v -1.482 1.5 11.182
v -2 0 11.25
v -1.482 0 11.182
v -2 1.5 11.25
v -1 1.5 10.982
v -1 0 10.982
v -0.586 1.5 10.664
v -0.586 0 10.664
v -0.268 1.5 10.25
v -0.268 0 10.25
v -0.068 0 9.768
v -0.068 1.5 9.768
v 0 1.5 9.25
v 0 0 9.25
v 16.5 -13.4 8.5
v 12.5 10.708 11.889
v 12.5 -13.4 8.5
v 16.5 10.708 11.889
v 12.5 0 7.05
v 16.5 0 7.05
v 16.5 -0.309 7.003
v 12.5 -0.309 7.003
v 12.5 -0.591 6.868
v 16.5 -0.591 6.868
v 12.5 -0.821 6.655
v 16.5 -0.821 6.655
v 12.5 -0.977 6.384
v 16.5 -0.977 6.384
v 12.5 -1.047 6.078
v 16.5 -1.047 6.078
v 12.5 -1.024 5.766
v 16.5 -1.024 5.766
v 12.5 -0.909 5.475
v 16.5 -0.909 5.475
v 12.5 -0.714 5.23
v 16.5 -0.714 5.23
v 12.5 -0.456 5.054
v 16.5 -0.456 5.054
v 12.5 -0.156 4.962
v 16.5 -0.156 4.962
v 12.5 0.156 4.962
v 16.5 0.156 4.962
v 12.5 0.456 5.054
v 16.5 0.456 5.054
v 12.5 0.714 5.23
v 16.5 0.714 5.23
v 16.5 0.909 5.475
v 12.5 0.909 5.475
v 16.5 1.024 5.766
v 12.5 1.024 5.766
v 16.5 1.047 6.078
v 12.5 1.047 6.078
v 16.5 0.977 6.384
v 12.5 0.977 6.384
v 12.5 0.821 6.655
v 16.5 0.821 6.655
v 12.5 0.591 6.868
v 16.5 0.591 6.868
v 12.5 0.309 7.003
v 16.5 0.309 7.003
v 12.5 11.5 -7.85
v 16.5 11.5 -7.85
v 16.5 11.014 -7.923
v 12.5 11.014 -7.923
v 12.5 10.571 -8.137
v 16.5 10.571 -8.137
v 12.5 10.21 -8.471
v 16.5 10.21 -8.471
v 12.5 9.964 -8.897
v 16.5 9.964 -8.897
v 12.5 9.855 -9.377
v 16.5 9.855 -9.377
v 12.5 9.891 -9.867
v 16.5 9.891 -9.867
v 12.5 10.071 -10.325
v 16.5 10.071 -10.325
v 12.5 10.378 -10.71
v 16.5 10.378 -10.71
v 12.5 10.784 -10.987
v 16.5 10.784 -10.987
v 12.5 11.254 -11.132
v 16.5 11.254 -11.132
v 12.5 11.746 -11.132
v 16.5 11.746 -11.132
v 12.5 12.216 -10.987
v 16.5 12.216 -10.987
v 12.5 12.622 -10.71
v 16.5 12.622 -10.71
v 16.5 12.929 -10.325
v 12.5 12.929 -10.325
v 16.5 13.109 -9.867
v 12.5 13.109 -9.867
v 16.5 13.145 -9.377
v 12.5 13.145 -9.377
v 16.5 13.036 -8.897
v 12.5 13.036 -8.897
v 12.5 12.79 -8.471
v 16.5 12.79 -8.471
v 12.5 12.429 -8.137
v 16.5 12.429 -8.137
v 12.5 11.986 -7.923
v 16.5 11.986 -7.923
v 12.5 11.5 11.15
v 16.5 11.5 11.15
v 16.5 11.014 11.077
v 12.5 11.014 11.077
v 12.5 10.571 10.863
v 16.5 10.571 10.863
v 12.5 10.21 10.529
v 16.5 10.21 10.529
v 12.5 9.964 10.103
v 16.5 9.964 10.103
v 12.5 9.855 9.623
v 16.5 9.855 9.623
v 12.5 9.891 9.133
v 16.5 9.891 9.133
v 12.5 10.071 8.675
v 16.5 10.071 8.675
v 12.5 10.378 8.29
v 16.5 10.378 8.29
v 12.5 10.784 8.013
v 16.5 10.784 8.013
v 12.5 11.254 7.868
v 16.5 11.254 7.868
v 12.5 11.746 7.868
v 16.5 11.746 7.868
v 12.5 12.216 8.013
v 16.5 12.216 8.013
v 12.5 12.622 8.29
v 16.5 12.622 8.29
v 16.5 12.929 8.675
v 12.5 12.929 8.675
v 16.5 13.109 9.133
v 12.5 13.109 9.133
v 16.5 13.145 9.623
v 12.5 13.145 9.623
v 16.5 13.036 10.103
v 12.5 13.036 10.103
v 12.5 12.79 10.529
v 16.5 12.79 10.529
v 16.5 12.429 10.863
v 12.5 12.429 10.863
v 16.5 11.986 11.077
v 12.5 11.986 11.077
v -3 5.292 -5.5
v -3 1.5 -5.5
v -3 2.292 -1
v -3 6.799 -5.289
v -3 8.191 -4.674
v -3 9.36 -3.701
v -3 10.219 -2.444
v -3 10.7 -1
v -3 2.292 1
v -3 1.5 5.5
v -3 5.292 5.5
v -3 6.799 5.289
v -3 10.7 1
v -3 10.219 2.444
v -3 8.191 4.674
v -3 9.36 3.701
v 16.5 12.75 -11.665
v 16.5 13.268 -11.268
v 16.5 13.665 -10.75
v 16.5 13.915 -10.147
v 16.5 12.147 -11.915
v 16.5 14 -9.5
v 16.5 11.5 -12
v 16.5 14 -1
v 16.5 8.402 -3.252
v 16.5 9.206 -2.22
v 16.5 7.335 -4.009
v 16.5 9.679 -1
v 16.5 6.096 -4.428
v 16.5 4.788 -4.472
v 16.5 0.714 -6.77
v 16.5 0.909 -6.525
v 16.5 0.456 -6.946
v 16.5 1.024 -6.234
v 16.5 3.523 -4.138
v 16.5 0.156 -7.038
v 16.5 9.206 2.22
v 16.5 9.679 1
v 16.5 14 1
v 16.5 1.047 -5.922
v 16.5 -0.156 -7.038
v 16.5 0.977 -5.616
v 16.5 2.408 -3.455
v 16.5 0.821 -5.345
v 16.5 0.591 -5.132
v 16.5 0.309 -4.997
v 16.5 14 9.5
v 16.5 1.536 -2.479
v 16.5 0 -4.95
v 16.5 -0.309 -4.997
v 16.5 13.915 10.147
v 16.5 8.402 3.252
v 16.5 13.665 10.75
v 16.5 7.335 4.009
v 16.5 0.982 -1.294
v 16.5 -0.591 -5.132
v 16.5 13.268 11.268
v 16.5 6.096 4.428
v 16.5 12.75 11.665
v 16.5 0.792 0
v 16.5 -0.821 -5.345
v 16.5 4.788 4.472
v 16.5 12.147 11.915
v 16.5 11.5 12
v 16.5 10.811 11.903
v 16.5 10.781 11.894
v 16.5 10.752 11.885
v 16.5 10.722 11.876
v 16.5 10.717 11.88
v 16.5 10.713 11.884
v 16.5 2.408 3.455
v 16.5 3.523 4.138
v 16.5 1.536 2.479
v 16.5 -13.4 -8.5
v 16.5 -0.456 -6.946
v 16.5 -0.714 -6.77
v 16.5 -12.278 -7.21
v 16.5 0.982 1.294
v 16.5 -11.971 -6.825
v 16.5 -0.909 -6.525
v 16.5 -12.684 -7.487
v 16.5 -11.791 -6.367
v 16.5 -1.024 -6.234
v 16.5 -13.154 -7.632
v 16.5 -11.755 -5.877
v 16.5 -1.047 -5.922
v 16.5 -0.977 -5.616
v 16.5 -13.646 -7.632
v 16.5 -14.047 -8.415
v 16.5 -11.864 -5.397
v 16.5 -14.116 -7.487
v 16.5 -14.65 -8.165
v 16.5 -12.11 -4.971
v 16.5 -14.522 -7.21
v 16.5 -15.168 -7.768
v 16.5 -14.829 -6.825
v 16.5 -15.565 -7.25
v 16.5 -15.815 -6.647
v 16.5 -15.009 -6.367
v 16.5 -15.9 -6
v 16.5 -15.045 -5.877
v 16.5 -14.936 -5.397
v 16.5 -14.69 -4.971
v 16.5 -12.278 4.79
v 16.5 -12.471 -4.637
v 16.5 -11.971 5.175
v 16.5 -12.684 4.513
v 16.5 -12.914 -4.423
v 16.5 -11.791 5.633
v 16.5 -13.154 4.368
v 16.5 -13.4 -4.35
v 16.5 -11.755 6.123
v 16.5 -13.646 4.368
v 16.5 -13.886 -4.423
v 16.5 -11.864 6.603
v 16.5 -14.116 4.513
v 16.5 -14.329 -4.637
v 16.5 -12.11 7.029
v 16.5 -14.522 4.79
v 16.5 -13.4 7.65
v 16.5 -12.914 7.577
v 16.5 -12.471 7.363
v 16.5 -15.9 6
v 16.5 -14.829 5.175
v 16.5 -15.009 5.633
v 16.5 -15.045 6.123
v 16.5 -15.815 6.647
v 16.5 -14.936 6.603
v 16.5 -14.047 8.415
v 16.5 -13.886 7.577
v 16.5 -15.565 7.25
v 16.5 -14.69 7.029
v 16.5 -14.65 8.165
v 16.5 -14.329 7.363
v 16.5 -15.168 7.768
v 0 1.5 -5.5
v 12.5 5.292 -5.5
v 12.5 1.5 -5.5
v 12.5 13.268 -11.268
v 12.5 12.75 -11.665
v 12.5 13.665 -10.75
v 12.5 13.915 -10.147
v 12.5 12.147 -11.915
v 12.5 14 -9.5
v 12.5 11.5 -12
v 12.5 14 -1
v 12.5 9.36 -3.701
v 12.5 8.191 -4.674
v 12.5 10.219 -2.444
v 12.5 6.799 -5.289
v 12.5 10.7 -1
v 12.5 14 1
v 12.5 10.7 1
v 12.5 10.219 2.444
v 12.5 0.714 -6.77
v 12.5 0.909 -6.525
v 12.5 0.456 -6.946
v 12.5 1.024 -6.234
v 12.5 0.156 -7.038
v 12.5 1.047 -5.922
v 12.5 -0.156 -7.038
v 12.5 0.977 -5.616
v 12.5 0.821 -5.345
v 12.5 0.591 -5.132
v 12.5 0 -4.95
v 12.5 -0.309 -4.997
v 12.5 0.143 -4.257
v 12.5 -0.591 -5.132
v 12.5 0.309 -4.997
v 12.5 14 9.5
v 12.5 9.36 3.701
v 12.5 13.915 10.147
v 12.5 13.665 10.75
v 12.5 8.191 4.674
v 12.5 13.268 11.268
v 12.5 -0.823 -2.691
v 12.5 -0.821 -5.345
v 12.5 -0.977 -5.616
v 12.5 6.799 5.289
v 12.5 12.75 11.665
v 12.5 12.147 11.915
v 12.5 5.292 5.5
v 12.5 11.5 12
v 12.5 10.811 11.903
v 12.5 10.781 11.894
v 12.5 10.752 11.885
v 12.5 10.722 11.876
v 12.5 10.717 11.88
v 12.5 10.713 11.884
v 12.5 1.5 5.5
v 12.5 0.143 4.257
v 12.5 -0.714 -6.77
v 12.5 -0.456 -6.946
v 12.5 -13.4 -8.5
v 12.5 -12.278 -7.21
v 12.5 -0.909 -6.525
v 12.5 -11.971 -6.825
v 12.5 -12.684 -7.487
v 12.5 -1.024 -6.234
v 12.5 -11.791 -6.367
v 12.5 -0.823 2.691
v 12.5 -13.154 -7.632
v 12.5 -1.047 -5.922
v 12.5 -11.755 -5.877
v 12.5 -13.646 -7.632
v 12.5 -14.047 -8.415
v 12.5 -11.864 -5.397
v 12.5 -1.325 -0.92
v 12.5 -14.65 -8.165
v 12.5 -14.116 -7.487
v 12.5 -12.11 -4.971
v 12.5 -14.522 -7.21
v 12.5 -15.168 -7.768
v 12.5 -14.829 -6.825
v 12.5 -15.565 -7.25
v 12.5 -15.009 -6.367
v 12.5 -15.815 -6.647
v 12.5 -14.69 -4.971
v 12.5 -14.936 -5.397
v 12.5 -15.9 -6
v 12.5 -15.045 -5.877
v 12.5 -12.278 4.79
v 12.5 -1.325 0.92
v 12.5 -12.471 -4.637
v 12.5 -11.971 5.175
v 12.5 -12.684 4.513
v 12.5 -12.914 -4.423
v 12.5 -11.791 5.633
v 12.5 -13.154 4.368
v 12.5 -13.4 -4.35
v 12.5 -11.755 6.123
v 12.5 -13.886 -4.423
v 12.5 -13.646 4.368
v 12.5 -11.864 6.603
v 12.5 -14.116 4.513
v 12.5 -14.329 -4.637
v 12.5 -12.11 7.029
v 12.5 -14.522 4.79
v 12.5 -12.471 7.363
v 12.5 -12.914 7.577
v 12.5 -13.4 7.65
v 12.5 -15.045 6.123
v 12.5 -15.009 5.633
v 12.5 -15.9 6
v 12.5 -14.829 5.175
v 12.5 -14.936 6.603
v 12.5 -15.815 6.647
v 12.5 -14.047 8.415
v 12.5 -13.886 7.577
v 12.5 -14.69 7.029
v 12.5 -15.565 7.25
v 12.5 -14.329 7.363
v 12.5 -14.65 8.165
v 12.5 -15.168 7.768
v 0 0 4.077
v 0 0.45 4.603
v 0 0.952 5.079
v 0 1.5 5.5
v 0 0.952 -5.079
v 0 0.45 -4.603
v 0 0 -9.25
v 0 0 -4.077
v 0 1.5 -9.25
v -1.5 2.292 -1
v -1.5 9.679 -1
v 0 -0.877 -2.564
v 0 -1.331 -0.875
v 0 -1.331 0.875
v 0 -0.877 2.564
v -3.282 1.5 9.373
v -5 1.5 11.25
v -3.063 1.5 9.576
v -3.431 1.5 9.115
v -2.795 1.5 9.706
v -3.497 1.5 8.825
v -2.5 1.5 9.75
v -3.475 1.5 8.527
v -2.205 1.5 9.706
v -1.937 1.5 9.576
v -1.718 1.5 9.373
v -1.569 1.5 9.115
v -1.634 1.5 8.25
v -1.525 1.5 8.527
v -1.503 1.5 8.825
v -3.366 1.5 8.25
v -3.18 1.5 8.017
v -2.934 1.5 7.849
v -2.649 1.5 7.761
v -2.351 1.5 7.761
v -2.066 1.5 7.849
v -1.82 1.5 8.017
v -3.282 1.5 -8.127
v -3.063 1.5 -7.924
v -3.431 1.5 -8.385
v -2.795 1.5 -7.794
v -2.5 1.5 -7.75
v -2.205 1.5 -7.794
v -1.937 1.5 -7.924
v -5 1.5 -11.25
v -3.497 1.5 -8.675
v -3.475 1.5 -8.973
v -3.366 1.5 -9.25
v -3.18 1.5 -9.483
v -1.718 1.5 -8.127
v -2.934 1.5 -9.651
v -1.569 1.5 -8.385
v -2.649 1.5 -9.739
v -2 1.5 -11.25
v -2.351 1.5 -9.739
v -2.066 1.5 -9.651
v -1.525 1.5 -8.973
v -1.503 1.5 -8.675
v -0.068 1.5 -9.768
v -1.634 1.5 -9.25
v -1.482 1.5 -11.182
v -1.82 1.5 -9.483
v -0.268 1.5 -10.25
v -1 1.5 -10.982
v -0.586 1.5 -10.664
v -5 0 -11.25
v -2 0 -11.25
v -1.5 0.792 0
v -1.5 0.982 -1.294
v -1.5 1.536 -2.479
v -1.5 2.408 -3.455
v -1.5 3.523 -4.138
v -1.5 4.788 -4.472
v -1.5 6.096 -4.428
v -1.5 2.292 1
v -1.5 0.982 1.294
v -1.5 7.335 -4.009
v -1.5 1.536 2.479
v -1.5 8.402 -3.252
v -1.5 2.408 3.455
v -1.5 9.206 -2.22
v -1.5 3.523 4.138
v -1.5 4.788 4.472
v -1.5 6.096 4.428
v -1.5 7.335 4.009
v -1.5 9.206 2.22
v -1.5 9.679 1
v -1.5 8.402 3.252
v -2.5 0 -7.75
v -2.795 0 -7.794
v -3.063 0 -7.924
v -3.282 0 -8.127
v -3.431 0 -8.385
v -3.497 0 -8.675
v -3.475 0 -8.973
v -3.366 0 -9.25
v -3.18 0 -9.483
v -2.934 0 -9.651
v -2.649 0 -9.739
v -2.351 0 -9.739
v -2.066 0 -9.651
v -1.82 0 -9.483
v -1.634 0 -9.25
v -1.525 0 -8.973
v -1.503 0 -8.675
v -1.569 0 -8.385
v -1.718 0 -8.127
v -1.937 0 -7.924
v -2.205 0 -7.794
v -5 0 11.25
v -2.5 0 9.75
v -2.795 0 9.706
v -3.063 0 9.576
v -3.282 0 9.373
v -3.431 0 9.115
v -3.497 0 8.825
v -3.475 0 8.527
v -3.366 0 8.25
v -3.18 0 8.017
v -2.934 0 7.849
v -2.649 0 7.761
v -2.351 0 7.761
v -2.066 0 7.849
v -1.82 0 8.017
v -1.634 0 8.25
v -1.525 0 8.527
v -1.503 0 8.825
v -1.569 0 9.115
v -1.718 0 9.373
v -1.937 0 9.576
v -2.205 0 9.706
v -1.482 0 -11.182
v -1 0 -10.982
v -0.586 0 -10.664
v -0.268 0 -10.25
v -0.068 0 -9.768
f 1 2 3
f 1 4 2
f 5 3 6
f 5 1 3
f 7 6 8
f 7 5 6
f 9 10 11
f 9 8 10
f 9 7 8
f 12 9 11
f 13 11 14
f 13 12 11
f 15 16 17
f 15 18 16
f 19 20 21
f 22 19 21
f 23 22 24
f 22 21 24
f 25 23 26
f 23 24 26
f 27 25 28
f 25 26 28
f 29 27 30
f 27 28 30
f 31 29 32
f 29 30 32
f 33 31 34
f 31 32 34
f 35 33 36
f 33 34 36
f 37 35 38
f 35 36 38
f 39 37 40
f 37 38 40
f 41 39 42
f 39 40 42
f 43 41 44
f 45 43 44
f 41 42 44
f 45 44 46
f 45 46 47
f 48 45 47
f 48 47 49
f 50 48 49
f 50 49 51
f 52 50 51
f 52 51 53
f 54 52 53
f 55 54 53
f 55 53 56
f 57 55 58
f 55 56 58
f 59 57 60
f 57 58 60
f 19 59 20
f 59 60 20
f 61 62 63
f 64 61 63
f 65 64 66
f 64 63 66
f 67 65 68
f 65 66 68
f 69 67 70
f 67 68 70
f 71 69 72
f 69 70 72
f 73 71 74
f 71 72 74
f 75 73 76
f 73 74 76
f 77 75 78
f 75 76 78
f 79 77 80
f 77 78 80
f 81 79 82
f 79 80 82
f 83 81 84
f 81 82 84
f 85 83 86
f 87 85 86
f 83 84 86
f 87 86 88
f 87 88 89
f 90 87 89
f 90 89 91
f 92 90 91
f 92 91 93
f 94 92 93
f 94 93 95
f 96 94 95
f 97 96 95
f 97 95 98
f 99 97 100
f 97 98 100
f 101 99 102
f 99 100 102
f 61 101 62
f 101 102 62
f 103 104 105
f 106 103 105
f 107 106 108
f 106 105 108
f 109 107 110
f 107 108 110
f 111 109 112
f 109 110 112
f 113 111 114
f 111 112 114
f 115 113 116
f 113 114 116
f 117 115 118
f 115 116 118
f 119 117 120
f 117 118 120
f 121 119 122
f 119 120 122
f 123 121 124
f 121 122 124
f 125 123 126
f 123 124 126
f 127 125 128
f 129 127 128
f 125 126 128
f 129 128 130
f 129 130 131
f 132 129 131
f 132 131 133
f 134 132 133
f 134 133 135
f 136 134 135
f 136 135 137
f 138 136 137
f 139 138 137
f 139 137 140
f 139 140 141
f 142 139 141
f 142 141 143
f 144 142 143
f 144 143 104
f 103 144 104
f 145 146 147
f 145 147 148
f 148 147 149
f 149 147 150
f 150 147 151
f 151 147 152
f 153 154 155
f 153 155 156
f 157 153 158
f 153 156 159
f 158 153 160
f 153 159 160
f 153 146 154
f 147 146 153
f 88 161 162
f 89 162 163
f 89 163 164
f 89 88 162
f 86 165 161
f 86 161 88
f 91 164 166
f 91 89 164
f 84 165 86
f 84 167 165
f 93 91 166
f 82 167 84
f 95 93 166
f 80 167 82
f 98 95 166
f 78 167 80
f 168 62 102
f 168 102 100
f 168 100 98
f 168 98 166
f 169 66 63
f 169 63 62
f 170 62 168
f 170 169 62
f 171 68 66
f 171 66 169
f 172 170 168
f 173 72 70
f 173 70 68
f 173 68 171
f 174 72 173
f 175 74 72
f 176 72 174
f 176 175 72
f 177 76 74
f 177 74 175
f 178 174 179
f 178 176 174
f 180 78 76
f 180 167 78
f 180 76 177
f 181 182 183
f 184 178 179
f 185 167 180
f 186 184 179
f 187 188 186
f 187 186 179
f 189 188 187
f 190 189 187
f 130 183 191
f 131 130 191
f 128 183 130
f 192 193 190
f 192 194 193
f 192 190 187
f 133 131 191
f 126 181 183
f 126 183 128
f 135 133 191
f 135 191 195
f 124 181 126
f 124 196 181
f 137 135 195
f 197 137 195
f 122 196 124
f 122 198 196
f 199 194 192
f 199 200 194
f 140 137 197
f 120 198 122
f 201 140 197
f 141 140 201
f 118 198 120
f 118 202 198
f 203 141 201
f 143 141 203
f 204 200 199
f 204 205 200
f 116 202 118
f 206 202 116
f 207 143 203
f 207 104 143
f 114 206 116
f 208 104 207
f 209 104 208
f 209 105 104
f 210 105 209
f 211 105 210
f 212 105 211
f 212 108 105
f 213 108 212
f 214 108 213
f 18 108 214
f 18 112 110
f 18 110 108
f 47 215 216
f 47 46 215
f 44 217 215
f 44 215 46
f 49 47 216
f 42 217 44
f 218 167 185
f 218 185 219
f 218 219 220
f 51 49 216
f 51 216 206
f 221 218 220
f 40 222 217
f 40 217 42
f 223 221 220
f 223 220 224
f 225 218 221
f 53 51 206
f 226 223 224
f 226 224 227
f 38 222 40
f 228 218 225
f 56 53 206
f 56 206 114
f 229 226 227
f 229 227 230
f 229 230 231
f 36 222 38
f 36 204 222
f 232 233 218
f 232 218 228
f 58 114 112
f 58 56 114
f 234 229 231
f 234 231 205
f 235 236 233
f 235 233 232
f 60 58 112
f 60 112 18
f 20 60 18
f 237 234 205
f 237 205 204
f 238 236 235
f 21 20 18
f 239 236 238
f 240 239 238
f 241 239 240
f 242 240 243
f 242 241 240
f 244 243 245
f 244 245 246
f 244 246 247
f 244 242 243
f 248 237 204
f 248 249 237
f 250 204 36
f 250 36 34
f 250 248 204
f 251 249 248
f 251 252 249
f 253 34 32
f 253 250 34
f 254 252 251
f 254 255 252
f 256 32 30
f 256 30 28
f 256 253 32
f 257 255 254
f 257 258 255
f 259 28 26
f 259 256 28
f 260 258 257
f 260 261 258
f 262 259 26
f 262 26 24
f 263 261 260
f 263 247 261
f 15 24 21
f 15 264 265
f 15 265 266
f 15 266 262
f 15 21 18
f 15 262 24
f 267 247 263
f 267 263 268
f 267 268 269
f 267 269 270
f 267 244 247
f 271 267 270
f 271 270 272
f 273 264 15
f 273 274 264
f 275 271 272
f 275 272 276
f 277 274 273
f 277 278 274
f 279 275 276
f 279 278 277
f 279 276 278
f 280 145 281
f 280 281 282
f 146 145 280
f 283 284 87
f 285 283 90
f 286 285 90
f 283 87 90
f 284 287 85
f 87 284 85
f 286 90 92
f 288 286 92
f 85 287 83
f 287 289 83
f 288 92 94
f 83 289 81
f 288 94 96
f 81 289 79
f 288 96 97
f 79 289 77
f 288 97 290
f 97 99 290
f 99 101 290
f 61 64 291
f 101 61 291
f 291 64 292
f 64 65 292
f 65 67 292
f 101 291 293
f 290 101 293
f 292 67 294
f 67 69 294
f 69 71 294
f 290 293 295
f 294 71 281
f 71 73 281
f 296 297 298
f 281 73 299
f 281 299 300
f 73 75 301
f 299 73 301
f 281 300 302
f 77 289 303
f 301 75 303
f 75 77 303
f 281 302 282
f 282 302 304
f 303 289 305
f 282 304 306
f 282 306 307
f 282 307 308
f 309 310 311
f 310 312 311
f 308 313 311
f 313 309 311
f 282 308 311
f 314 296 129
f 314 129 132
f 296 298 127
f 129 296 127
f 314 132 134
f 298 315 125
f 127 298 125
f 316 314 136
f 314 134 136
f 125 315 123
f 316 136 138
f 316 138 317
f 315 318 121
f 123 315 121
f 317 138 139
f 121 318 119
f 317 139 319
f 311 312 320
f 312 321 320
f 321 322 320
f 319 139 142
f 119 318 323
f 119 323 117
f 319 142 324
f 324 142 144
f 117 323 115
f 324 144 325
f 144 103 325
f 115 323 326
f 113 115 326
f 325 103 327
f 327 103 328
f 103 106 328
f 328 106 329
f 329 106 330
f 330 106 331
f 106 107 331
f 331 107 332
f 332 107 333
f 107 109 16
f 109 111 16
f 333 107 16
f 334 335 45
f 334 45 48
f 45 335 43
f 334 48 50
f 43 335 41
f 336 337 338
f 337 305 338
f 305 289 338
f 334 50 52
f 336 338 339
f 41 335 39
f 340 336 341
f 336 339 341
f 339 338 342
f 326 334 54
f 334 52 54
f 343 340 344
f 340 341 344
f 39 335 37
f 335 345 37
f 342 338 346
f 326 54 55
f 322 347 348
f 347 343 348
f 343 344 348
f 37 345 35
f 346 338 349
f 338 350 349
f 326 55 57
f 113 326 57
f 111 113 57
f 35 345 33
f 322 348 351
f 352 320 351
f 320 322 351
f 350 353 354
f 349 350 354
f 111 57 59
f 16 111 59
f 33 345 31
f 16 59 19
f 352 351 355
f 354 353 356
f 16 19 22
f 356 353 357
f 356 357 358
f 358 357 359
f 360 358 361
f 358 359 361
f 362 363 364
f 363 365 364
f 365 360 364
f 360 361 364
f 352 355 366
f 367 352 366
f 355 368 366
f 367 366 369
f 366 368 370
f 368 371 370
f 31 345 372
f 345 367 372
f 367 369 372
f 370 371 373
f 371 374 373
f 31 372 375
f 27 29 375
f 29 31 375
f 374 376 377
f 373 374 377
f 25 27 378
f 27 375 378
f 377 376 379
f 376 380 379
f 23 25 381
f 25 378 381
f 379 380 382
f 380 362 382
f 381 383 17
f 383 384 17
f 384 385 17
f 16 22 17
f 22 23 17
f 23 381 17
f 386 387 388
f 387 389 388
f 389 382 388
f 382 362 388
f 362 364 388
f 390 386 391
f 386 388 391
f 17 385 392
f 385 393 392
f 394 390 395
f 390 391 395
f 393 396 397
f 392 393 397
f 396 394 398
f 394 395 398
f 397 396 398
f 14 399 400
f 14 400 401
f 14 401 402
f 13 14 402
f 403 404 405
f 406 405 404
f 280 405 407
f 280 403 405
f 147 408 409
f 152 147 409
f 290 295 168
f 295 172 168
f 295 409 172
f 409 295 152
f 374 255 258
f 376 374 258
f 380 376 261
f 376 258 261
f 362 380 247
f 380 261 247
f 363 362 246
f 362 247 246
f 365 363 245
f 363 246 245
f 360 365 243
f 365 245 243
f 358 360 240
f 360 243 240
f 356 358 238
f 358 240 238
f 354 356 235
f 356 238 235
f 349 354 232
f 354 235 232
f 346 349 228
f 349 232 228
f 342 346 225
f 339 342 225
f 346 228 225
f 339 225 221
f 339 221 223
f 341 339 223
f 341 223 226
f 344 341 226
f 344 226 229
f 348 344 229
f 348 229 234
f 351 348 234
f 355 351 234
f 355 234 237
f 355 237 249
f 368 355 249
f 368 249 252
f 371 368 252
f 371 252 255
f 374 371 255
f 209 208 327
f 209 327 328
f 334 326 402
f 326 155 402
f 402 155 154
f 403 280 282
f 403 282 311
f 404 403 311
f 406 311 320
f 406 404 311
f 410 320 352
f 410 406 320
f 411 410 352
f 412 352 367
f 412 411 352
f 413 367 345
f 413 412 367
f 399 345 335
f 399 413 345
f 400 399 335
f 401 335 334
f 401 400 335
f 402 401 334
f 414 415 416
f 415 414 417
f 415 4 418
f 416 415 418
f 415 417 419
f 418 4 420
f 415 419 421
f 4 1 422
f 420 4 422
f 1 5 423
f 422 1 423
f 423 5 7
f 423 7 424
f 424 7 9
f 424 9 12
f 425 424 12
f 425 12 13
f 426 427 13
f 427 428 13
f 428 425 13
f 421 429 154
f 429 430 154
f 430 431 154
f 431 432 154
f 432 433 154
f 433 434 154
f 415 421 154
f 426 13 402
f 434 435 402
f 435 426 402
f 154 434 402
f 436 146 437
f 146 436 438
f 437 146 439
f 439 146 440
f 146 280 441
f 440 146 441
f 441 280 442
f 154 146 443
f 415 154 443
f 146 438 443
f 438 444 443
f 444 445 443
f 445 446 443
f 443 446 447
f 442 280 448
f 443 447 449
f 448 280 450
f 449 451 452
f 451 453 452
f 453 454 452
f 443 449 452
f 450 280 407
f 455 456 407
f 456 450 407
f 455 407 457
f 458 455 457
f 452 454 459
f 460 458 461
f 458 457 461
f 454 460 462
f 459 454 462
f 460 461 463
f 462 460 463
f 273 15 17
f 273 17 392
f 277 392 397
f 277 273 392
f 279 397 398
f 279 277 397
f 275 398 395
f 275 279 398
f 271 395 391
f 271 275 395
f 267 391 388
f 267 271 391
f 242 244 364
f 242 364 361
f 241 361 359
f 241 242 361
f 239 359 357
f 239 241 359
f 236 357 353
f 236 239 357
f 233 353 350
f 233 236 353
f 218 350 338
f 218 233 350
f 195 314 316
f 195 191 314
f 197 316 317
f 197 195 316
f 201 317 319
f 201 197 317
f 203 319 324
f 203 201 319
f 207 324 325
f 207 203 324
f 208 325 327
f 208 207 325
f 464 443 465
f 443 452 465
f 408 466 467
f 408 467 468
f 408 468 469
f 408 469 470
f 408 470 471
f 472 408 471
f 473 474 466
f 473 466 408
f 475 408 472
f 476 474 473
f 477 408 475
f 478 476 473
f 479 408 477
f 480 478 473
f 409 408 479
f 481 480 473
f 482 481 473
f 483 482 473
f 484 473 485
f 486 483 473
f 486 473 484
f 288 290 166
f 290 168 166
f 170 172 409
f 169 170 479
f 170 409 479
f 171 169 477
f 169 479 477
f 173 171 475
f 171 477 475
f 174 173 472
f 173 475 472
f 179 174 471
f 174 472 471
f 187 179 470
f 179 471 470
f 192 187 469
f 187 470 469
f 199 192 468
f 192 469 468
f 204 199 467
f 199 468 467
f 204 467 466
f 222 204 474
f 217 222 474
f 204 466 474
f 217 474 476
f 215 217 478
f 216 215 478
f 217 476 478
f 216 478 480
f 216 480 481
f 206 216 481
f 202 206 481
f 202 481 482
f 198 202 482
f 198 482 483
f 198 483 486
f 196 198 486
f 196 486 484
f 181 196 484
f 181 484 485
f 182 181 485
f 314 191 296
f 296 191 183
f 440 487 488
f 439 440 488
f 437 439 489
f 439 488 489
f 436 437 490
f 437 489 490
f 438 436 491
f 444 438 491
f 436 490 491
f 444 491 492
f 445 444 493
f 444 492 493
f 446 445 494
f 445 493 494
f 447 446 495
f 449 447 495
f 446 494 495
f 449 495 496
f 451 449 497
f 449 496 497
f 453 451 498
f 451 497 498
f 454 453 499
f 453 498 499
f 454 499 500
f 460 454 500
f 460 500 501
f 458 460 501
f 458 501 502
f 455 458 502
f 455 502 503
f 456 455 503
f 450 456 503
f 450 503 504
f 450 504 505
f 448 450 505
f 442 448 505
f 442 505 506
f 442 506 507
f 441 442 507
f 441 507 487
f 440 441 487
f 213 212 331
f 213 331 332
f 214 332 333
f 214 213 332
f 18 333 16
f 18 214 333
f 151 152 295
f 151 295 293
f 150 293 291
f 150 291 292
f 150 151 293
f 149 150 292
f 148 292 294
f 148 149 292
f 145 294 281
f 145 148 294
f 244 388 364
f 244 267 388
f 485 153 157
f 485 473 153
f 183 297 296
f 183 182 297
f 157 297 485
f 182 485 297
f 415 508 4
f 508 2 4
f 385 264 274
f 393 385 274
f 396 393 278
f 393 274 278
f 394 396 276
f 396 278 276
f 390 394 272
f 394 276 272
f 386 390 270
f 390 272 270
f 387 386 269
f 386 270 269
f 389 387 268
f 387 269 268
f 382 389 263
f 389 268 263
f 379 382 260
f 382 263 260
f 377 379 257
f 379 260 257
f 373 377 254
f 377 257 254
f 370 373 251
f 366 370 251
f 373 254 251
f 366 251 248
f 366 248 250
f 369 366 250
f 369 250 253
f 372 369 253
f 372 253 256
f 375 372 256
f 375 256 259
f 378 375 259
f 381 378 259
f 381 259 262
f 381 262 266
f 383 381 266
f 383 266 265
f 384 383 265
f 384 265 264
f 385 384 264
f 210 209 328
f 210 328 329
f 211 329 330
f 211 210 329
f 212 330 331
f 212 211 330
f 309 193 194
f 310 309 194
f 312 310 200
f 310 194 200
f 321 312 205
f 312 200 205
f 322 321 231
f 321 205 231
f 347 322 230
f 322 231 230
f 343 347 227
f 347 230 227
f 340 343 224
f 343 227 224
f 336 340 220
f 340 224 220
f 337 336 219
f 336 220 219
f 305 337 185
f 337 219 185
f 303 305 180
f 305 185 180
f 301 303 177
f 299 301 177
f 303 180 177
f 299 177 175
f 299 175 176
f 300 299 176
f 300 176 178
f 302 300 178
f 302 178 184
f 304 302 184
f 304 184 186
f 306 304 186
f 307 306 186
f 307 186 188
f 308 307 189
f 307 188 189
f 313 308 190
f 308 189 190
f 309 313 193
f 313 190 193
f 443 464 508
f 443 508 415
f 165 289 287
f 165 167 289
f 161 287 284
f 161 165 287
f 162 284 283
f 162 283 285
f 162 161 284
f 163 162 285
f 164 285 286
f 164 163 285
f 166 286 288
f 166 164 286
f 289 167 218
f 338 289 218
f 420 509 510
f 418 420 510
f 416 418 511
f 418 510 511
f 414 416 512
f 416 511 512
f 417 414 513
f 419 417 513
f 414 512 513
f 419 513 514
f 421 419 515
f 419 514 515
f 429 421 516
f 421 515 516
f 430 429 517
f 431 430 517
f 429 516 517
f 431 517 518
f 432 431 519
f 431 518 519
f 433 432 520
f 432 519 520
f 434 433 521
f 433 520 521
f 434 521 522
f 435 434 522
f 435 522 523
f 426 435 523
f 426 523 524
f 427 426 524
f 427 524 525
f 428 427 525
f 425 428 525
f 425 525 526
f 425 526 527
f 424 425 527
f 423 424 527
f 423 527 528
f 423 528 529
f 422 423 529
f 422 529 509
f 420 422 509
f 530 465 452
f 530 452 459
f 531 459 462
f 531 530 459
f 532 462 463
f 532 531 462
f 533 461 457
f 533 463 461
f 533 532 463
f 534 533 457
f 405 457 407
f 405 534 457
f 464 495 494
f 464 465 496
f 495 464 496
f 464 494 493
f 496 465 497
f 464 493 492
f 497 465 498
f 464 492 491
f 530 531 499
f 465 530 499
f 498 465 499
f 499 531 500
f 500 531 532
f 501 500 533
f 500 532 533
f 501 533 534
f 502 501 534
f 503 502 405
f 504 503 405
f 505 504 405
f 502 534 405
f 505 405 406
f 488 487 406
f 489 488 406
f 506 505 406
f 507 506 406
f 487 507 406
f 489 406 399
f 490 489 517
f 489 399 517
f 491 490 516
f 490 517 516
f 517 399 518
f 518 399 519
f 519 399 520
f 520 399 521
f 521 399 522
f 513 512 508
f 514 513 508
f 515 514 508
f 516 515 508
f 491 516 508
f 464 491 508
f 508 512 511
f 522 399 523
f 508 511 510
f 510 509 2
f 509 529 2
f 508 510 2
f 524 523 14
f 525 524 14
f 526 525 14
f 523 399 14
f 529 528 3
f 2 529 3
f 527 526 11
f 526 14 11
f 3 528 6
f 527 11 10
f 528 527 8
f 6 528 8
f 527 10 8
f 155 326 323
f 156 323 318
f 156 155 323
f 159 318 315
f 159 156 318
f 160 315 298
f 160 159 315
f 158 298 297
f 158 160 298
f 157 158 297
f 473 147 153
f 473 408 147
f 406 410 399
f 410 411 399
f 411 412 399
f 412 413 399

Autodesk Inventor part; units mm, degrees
ref_plane "YZ Plane" through (0, 0, 0) normal (1, 0, 0) x (0, 1, 0)
ref_plane "XZ Plane" through (0, 0, 0) normal (0, 1, 0) x (-1, 0, 0)
ref_plane "XY Plane" through (0, 0, 0) normal (0, 0, 1) x (1, 0, 0)
sketch "スケッチ2" plane through (0, 0, 0) normal (0, 1, 0) x (-1, 0, 0)
  line L0 (-32.5, -11.25) -> (32.5, -11.25)
  line L1 (32.5, -11.25) -> (32.5, 11.25)
  line L2 (32.5, 11.25) -> (-32.5, 11.25)
  line L3 (-32.5, 11.25) -> (-32.5, -11.25)
  line L4 (-32.5, -11.25) -> (32.5, 11.25) construction
  line L5 (32.5, -11.25) -> (-32.5, 11.25) construction
  line L6 (-30, -8.75) -> (30, -8.75)
  line L7 (30, -8.75) -> (30, 8.75)
  line L8 (30, 8.75) -> (-30, 8.75)
  line L9 (-30, 8.75) -> (-30, -8.75)
  line L10 (-30, -8.75) -> (30, 8.75) construction
  line L11 (30, -8.75) -> (-30, 8.75) construction
  circle A0 centre (30, 8.75) radius 2.5
  circle A1 centre (30, -8.75) radius 2.5
  circle A2 centre (-30, 8.75) radius 2.5
  circle A3 centre (-30, -8.75) radius 2.5
  line L12 (-115, -18.25) -> (115, -18.25)
  line L13 (115, -18.25) -> (115, 18.25)
  line L14 (115, 18.25) -> (-115, 18.25)
  line L15 (-115, 18.25) -> (-115, -18.25)
  line L16 (-115, -18.25) -> (115, 18.25) construction
  line L17 (115, -18.25) -> (-115, 18.25) construction
  line L18 (-95, -18.25) -> (95, -18.25)
  line L19 (95, -18.25) -> (95, 18.25)
  line L20 (95, 18.25) -> (-95, 18.25)
  line L21 (-95, 18.25) -> (-95, -18.25)
  line L22 (-95, -18.25) -> (95, 18.25) construction
  line L23 (95, -18.25) -> (-95, 18.25) construction
  point P0 (0, 0)
  dimension "d10" = 65
  dimension "d11" = 22.5
  dimension "d12" = 60
  dimension "d13" = 17.5
  dimension "d14" = 230
  dimension "d15" = 36.5
  dimension "d16" = 190
sketch "スケッチ4" plane through (0, 0, 0) normal (1, 0, 0) x (0, 1, 0)
  point P0 (0, 0)
sketch "スケッチ5" plane through (0, 0, 0) normal (1, 0, 0) x (0, 1, 0)
  circle A0 centre (0, 0) radius 18.25
  line L0 (0, 0) -> (0, 6)
  line L1 (0, 6) -> (0, -6)
  circle A1 centre (0, 6) radius 3
  circle A2 centre (0, -6) radius 9
  circle A3 centre (0, 6) radius 9
  circle A4 centre (0, -6) radius 3
  line L2 (0, 6) -> (5.2915, 0)
  circle A5 centre (5.2915, 0) radius 5
  circle A6 centre (5.2915, 0) radius 4.5
  circle A7 centre (5.2915, 0) radius 5.5
  line L3 (0, 0) -> (0, 11.25)
  line L4 (0, 11.25) -> (0, -11.25)
  line L5 (5.2915, 5.5) -> (5.2915, -5.5)
  line L6 (0, 11.25) -> (-1.2, 11.25)
  line L7 (-1.2, 11.25) -> (-1.2, -11.25)
  line L8 (-1.2, -11.25) -> (0, -11.25)
  line L9 (-1.2, 11.25) -> (-9.2, 11.25)
  line L10 (-1.2, -11.25) -> (-9.2, -11.25)
  line L11 (-9.2, -11.25) -> (-9.2, 11.25)
  line L12 (-9.2, 11.25) -> (-10.4, 11.25)
  line L13 (-10.4, 11.25) -> (-10.4, -11.25)
  line L14 (-10.4, -11.25) -> (-9.2, -11.25)
  circle A8 centre (0, 0) radius 16
  line L15 (0, 11.25) -> (1.5, 11.25)
  line L16 (1.5, 11.25) -> (1.5, -11.25)
  line L17 (1.5, -11.25) -> (0, -11.25)
  line L18 (5.2915, 5.5) -> (1.5, 5.5)
  line L19 (5.2915, -5.5) -> (1.5, -5.5)
  circle A9 centre (5.2915, 0) radius 6.6802
  point P0 (0, 1.5)
  point P1 (0, -1.5)
  point P2 (1.5, -3.9843)
  point P3 (1.5, 3.9843)
  dimension "d28" = 36.5
  dimension "d29" = 6
  dimension "d30" = 12
  dimension "d31" = 6
  dimension "d32" = 18
  dimension "d33" = 8
  dimension "d34" = 9
  dimension "d35" = 11
  dimension "d36" = 11.25
  dimension "d37" = 22.5
  dimension "d39" = 1.2
  dimension "d40" = 8
  dimension "d41" = 1.2
  dimension "d42" = 32
  dimension "d43" = 1.5
extrude "押し出し1" add sketch "スケッチ5" against normal blind 5 contours L0 A7 A2 A5 A3 L1 | L0 A2 A7 | A7 A3 L1 | L0 A9 L2 L16 A7 A1 | A1 A7 A2 | A7 A1 L16 A5 A2 | A4 A7 L16 A9 L1 | A3 A7 A4 | A3 A5 L16 A4 A7 | L0 L2 A9 | A7 L16 A1 | A5 L16 A2 | A2 L16 A6 A3 A5 | A9 L16 A4 L4 L1 | A4 L16 A7 | A3 L16 A5 | L3 A1 L16 A9 L2 | A9 L16 L2 | L3 L15 L16 A1 | L16 A6 | A4 L16 L17 L4 picked at (1.4091, -3.6973)
extrude "押し出し2" add sketch "スケッチ5" against normal blind 3 contours L0 A7 A2 A5 A3 L1 | A7 A1 L16 A5 A2 | A3 A5 L16 A4 A7 | A7 L16 A1 | A5 L16 A2 | A2 L16 A6 A3 A5 | A4 L16 A7 | A3 L16 A5 | L16 A7 L2 A1 | A1 A5 L16 | L16 L2 A7 | L16 A5 L2 A6 A2 | A2 A6 L16 | L16 A7 A4 L19 | L16 A5 A4 | A4 A7 L16 | L16 A6 A3 | A3 A6 L5 A5 L16 | L16 L18 A1 A7 L2 | L2 A7 A1 | A5 L5 A6 L2 | A1 A7 L5 A5 | A6 L2 A2 | A2 L2 L5 A3 A6 L16 | L16 A6 | A4 A7 L19 | A5 L5 A7 A4 | A3 L5 A6 | L18 A7 A1 | A6 L5 A2 L2 | L5 A7 A3 A5 | A5 A3 A6 L5 | A2 L5 L2 | L5 A5 A2 A7 | L5 A6 A2 A5 | L5 A2 A3 | A3 A2 A6 L5 | A6 A3 A2 L5 | A5 A2 A6 A3 | A3 A7 A2 A5 | A3 A6 A2
extrude "押し出し3" add sketch "スケッチ5" along normal blind 16.5 contours L1 A7 L0 | L0 A7 A2 A5 A3 L1 | A7 L1 A3 A9 L7 A2 L0 | L0 A2 A7 | A7 A3 L1 | A1 A9 L0 | A2 A9 A1 | L0 A9 L2 L16 A7 A1 | A1 A7 A2 | A7 A1 L16 A5 A2 | A4 A7 L16 A9 L1 | A4 A9 A3 | A3 A7 A4 | L1 A9 A4 | A3 A5 L16 A4 A7 | A7 L16 A1 | A5 L16 A2 | A2 L16 A6 A3 A5 | A4 L16 A7 | A3 L16 A5 | A9 L16 L2 | L16 A7 L2 A1 | A1 A5 L16 | L16 L2 A7 | L7 A9 | L16 A5 L2 A6 A2 | A2 A6 L16 | L16 A7 A4 L19 | L16 A5 A4 | A4 A7 L16 | L16 A6 A3 | A3 A6 L5 A5 L16 | L16 L18 A1 A7 L2 | L2 A7 A1 | A5 L5 A6 L2 | A1 A7 L5 A5 | A6 L2 A2 | A2 L2 L5 A3 A6 L16 | L16 A6 | A4 A7 L19 | A5 L5 A7 A4 | A3 L5 A6 | L18 A7 A1 | A6 L5 A2 L2 | L5 A7 A3 A5 | A5 A3 A6 L5 | A2 L5 L2 | L5 A5 A2 A7 | L5 A6 A2 A5 | L5 A2 A3 | A3 A2 A6 L5 | A6 A3 A2 L5 | A5 A2 A6 A3 | A3 A7 A2 A5 | A3 A6 A2
extrude "押し出し4" cut sketch "スケッチ5" along normal blind 16.5 contours A6 L2 A2 | A2 L2 L5 A3 A6 L16 | L16 A6 | A3 L5 A6 | A6 L5 A2 L2 | A2 L5 L2 | L5 A2 A3 | A3 A2 A6 L5 | A6 A3 A2 L5 | A3 A6 A2
extrude "押し出し5" cut sketch "スケッチ5" against normal blind 1.5 contours A6 L2 A2 | A2 L2 L5 A3 A6 L16 | L16 A6 | A3 L5 A6 | A6 L5 A2 L2 | A2 L5 L2 | L5 A2 A3 | A3 A2 A6 L5 | A6 A3 A2 L5 | A3 A6 A2
sketch "スケッチ6" plane through (16.5, 5.2915, 0) normal (1, 0, 0) x (0, 0, 1)
  line L0 (0, 5.2915) -> (6, 5.2915)
  line L1 (-11.25, 5.2915) -> (11.25, 5.2915) projected
  line L2 (6, 5.2915) -> (-6, 5.2915)
  circle A0 centre (6, 5.2915) radius 1.05
  circle A1 centre (-6, 5.2915) radius 1.05
  circle A2 centre (0, 5.2915) radius 16
  circle A3 centre (0, 0) radius 5
  line L3 (0, 0) -> (0, 3)
  line L4 (0, 3) -> (0, -5.5)
  arc A4 (-5.5, 0) -> (5.5, 0) centre (0, 0) ccw projected
  line L5 (0, 3) -> (1, 3)
  line L6 (1, 3) -> (-1, 3)
  line L7 (-1, 3) -> (-1, -5.4083)
  line L8 (1, 3) -> (1, -5.4083)
  circle A5 centre (6, 5.2915) radius 9
  circle A6 centre (-6, 5.2915) radius 9
  line L9 (0, 5.2915) -> (0, -2.7085)
  circle A7 centre (0, -2.7085) radius 8
  circle A8 centre (6, 5.2915) radius 10
  circle A9 centre (-6, 5.2915) radius 10
  line L10 (0, 5.2915) -> (0, -5.7085)
  line L11 (0, -5.7085) -> (-11.619, -5.7085)
  line L12 (0, -5.7085) -> (11.619, -5.7085)
  line L13 (0, -5.7085) -> (9.5, -5.7085)
  line L14 (9.5, -5.7085) -> (-9.5, -5.7085)
  circle A10 centre (0, 5.2915) radius 18
  line L15 (1, -5.4083) -> (1, -8.2085)
  line L16 (-1, -5.4083) -> (-1, -8.2085)
  line L17 (0, 5.2915) -> (0, 6.4915)
  line L18 (0, 6.4915) -> (0, 14.4915)
  line L19 (0, 14.4915) -> (0, 15.6915)
  line L20 (0, 15.6915) -> (-11.25, 15.6915)
  line L21 (-11.25, 15.6915) -> (11.25, 15.6915)
  line L22 (11.25, 15.6915) -> (11.25, 14.4915)
  line L23 (11.25, 14.4915) -> (0, 14.4915)
  line L24 (-11.25, 14.4915) -> (-11.25, 15.6915)
  line L25 (0, 14.4915) -> (-11.25, 14.4915)
  line L26 (0, 15.6915) -> (8.75, 15.6915)
  line L27 (8.75, 15.6915) -> (-8.75, 15.6915)
  line L28 (11.25, 15.6915) -> (11.25, 17.1915)
  line L29 (11.25, 17.1915) -> (-11.25, 17.1915)
  line L30 (-11.25, 17.1915) -> (-11.25, 15.6915)
  line L31 (6, 17.1915) -> (6, 18.6915)
  line L32 (-6, 17.1915) -> (-6, 18.6915)
  circle A11 centre (6, 18.6915) radius 2.5
  circle A12 centre (-6, 18.6915) radius 2.5
  line L33 (6, 21.1915) -> (-6, 21.1915)
  line L34 (9.5, -5.7085) -> (12, -5.7085)
  line L35 (-9.5, -5.7085) -> (-12, -5.7085)
  line L36 (6, 18.6915) -> (8.5, 18.6915)
  line L37 (-6, 18.6915) -> (-8.5, 18.6915)
  circle A13 centre (0, 0) radius 4.5
  circle A14 centre (-6, 5.2915) radius 1.5
  circle A15 centre (6, 5.2915) radius 1.5
  circle A16 centre (6, 18.6915) radius 1.65
  circle A17 centre (-6, 18.6915) radius 1.65
  line L38 (9.5, -5.7085) -> (9.5, -6.2085)
  line L39 (9.5, -6.2085) -> (-9.5, -6.2085)
  line L40 (-9.5, -6.2085) -> (-9.5, -5.7085)
  circle A18 centre (-9.5, -6.2085) radius 1.65
  circle A19 centre (9.5, -6.2085) radius 1.65
  circle A20 centre (9.5, -6.2085) radius 2.5
  circle A21 centre (-9.5, -6.2085) radius 2.5
  line L41 (-12, -6.2085) -> (-8.5, 18.6915)
  line L42 (12, -6.2085) -> (8.5, 18.6915)
  line L43 (9.5, -8.7085) -> (-9.5, -8.7085)
  line L44 (1, -8.7085) -> (1, -8.0358)
  line L45 (-1, -8.7085) -> (-1, -8.2085)
  point P0 (1, -4.3875)
  point P1 (-1, -4.3875)
  point P2 (-4.4567, 20.6583)
  point P3 (-8.495, 18.8501)
  point P4 (4.4567, 20.6583)
  point P5 (8.495, 18.8501)
  point P6 (1.7861, 21.1915)
  point P7 (-1.7861, 21.1915)
  point P8 (11.9031, -5.5193)
  point P9 (11.8759, -5.4306)
  point P10 (11.8887, -5.4164)
  dimension "d54" = 6
  dimension "d55" = 12
  dimension "d56" = 2.1
  dimension "d57" = 2.1
  dimension "d58" = 32
  dimension "d59" = 10
  dimension "d60" = 3
  dimension "d61" = 1
  dimension "d62" = 2
  dimension "d65" = 18
  dimension "d66" = 18
  dimension "d67" = 8
  dimension "d68" = 11
  dimension "d69" = 9.5
  dimension "d70" = 19
  dimension "d73" = 36
  dimension "d76" = 1.2
  dimension "d77" = 8
  dimension "d78" = 1.2
  dimension "d79" = 8.75
  dimension "d80" = 17.5
  dimension "d81" = 1.5
  dimension "d82" = 1.5
  dimension "d83" = 5
  dimension "d84" = 5
  dimension "d97" = 3
  dimension "d98" = 3
  dimension "d109" = 3.3
  dimension "d110" = 3.3
  dimension "d111" = 0.5
  dimension "d112" = 3.3
  dimension "d113" = 3.3
  dimension "d114" = 5
  dimension "d115" = 5
extrude "押し出し6" cut sketch "スケッチ6" against normal blind 19.5 contours L5 L8 A6 L4 L3 | L3 L4 A5 L7 L6 | L8 A9 A5 A6 | A5 A6 A8 L7 | L8 A5 A9 | A5 A9 L4 | L4 A8 A6 | A8 A6 L7 | L8 A8 A9 A5 | A8 L8 A13 L4 | A9 L7 A6 A8 | L4 A13 L7 A9 | L7 A13 L4 A3 | A3 L4 A4 L7 | L8 A4 L4 A3 | A3 L4 A13 L8
sketch "スケッチ7" plane through (-5, 1.5, -11.25) normal (0, 1, 0) x (1, 0, 0)
  line L0 (0, 0) -> (2.5, 0)
  line L1 (5, 0) -> (0, 0) projected
  line L2 (2.5, 0) -> (2.5, -22.5)
  line L3 (5, -22.5) -> (0, -22.5) projected
  line L4 (2.5, 0) -> (2.5, -2.5)
  line L5 (2.5, -2.5) -> (2.5, -20)
  point P0 (5, -11.25)
  dimension "d87" = 2.5
  dimension "d88" = 17.5
hole "穴1" at (-2.5, 1.5, -8.75) at (-2.5, 1.5, 8.75) direction (0, -1, 0) diameter 2 end through all
fillet "フィレット1" radius 2 2 edges at (0, 0.75, -11.25) (0, 0.75, 11.25)
extrude "押し出し11" add sketch "スケッチ6" against normal blind 4 contours L17 L18 A6 L0 | A7 A5 L1 | A7 A6 A3 L9 | L0 A6 A7 | L9 A3 A5 A7 | L1 A5 L18 L17 | A6 A5 A9 L0 | L0 A9 A7 A6 | A5 A7 A8 L1 | L1 A8 A6 A5 | L9 A13 A5 A3 | A3 A6 A13 L9 | A7 A9 A3 A6 | A5 A3 A8 A7 | A9 A5 L42 L1 A15 L0 | L0 A15 L1 L42 A5 A7 A9 | L18 A9 A5 | A6 A8 L18 | A8 A7 A6 L41 L1 A14 | L1 A14 L41 A6 A8 | A3 A9 A13 A6 | A5 A13 A8 A3 | A7 A5 A3 A9 | A8 A3 A6 A7 | A15 L1 A0 L0 | L0 A0 L1 A15 | A9 A8 L23 L42 A5 | A6 L41 L25 A9 A8 | L18 L23 A8 | A9 L25 L18 | A14 L1 A1 | L1 A1 A14 | A3 A5 A13 A9 | A8 A13 A6 A3 | A7 A21 A9 L41 A6 | A6 A4 A9 A21 A7 | L23 L19 L21 L42 A8 | A8 L42 L23 | L25 L41 A9 | A9 L41 L20 L19 L25 | A6 A13 A9 A3 | A3 A9 A4 A6 | A7 A20 A8 A4 A5 | A5 L42 A8 A20 A7 | A21 A9 A7 | A7 A9 A21 | L20 L41 L29 A12 A11 L42 L21 | A5 A4 A8 A3 | A3 A8 A13 A5 | A9 A13 L7 A3 | A3 L7 A4 A9 | A20 A8 A7 | A7 A8 A20 | A9 A21 A2 L41 | A4 L16 L11 A21 A9 | A9 A21 L11 A7 | A7 L11 A18 A2 A21 A9 | A8 A4 L8 A3 | A3 L8 A13 A8 | A8 A20 L12 L15 A4 | L42 A2 A20 A8 | A8 A20 A2 L12 A19 A7 | A7 L12 A20 A8 | A2 A21 L41 | L11 A21 L39 A7 | A7 L39 A18 L11 | L11 L16 L39 A21 | A2 L35 L41 A21 | L29 A11 L42 | L41 A12 L29 | L12 A19 L39 A7 | A7 L39 A20 L12 | A20 L42 L34 A2 | A20 L39 L15 L12 | L39 A21 A7 | A7 A21 A2 A18 L39 | L39 L16 L45 L43 A7 A21 | L11 A18 A2 | A2 A18 A21 L41 L35 | A11 L29 A16 | L29 A16 L36 A11 | L36 A16 A2 A11 | A12 L37 A17 L29 | L29 A17 A12 | A12 A2 A17 L37 | L39 A19 A2 A20 A7 | A7 A20 L39 | L34 L42 A20 A2 A19 | A2 A19 L12 | A20 A7 L43 L44 L15 L39 | A7 L43 A2 A21 | A2 A16 A11 | A11 A2 A16 L29 | L29 A12 A2 L33 A11 | L29 A17 A2 A12 | A12 A2 A17 | A20 A2 L43 A7 | A2 L43 A21 | A11 A2 L33 | L33 A2 A12 | A20 L43 A2 picked at (5.1751, 14.7127) picked at (-5.1751, 14.7127)
properties part number "ikafly1a"
